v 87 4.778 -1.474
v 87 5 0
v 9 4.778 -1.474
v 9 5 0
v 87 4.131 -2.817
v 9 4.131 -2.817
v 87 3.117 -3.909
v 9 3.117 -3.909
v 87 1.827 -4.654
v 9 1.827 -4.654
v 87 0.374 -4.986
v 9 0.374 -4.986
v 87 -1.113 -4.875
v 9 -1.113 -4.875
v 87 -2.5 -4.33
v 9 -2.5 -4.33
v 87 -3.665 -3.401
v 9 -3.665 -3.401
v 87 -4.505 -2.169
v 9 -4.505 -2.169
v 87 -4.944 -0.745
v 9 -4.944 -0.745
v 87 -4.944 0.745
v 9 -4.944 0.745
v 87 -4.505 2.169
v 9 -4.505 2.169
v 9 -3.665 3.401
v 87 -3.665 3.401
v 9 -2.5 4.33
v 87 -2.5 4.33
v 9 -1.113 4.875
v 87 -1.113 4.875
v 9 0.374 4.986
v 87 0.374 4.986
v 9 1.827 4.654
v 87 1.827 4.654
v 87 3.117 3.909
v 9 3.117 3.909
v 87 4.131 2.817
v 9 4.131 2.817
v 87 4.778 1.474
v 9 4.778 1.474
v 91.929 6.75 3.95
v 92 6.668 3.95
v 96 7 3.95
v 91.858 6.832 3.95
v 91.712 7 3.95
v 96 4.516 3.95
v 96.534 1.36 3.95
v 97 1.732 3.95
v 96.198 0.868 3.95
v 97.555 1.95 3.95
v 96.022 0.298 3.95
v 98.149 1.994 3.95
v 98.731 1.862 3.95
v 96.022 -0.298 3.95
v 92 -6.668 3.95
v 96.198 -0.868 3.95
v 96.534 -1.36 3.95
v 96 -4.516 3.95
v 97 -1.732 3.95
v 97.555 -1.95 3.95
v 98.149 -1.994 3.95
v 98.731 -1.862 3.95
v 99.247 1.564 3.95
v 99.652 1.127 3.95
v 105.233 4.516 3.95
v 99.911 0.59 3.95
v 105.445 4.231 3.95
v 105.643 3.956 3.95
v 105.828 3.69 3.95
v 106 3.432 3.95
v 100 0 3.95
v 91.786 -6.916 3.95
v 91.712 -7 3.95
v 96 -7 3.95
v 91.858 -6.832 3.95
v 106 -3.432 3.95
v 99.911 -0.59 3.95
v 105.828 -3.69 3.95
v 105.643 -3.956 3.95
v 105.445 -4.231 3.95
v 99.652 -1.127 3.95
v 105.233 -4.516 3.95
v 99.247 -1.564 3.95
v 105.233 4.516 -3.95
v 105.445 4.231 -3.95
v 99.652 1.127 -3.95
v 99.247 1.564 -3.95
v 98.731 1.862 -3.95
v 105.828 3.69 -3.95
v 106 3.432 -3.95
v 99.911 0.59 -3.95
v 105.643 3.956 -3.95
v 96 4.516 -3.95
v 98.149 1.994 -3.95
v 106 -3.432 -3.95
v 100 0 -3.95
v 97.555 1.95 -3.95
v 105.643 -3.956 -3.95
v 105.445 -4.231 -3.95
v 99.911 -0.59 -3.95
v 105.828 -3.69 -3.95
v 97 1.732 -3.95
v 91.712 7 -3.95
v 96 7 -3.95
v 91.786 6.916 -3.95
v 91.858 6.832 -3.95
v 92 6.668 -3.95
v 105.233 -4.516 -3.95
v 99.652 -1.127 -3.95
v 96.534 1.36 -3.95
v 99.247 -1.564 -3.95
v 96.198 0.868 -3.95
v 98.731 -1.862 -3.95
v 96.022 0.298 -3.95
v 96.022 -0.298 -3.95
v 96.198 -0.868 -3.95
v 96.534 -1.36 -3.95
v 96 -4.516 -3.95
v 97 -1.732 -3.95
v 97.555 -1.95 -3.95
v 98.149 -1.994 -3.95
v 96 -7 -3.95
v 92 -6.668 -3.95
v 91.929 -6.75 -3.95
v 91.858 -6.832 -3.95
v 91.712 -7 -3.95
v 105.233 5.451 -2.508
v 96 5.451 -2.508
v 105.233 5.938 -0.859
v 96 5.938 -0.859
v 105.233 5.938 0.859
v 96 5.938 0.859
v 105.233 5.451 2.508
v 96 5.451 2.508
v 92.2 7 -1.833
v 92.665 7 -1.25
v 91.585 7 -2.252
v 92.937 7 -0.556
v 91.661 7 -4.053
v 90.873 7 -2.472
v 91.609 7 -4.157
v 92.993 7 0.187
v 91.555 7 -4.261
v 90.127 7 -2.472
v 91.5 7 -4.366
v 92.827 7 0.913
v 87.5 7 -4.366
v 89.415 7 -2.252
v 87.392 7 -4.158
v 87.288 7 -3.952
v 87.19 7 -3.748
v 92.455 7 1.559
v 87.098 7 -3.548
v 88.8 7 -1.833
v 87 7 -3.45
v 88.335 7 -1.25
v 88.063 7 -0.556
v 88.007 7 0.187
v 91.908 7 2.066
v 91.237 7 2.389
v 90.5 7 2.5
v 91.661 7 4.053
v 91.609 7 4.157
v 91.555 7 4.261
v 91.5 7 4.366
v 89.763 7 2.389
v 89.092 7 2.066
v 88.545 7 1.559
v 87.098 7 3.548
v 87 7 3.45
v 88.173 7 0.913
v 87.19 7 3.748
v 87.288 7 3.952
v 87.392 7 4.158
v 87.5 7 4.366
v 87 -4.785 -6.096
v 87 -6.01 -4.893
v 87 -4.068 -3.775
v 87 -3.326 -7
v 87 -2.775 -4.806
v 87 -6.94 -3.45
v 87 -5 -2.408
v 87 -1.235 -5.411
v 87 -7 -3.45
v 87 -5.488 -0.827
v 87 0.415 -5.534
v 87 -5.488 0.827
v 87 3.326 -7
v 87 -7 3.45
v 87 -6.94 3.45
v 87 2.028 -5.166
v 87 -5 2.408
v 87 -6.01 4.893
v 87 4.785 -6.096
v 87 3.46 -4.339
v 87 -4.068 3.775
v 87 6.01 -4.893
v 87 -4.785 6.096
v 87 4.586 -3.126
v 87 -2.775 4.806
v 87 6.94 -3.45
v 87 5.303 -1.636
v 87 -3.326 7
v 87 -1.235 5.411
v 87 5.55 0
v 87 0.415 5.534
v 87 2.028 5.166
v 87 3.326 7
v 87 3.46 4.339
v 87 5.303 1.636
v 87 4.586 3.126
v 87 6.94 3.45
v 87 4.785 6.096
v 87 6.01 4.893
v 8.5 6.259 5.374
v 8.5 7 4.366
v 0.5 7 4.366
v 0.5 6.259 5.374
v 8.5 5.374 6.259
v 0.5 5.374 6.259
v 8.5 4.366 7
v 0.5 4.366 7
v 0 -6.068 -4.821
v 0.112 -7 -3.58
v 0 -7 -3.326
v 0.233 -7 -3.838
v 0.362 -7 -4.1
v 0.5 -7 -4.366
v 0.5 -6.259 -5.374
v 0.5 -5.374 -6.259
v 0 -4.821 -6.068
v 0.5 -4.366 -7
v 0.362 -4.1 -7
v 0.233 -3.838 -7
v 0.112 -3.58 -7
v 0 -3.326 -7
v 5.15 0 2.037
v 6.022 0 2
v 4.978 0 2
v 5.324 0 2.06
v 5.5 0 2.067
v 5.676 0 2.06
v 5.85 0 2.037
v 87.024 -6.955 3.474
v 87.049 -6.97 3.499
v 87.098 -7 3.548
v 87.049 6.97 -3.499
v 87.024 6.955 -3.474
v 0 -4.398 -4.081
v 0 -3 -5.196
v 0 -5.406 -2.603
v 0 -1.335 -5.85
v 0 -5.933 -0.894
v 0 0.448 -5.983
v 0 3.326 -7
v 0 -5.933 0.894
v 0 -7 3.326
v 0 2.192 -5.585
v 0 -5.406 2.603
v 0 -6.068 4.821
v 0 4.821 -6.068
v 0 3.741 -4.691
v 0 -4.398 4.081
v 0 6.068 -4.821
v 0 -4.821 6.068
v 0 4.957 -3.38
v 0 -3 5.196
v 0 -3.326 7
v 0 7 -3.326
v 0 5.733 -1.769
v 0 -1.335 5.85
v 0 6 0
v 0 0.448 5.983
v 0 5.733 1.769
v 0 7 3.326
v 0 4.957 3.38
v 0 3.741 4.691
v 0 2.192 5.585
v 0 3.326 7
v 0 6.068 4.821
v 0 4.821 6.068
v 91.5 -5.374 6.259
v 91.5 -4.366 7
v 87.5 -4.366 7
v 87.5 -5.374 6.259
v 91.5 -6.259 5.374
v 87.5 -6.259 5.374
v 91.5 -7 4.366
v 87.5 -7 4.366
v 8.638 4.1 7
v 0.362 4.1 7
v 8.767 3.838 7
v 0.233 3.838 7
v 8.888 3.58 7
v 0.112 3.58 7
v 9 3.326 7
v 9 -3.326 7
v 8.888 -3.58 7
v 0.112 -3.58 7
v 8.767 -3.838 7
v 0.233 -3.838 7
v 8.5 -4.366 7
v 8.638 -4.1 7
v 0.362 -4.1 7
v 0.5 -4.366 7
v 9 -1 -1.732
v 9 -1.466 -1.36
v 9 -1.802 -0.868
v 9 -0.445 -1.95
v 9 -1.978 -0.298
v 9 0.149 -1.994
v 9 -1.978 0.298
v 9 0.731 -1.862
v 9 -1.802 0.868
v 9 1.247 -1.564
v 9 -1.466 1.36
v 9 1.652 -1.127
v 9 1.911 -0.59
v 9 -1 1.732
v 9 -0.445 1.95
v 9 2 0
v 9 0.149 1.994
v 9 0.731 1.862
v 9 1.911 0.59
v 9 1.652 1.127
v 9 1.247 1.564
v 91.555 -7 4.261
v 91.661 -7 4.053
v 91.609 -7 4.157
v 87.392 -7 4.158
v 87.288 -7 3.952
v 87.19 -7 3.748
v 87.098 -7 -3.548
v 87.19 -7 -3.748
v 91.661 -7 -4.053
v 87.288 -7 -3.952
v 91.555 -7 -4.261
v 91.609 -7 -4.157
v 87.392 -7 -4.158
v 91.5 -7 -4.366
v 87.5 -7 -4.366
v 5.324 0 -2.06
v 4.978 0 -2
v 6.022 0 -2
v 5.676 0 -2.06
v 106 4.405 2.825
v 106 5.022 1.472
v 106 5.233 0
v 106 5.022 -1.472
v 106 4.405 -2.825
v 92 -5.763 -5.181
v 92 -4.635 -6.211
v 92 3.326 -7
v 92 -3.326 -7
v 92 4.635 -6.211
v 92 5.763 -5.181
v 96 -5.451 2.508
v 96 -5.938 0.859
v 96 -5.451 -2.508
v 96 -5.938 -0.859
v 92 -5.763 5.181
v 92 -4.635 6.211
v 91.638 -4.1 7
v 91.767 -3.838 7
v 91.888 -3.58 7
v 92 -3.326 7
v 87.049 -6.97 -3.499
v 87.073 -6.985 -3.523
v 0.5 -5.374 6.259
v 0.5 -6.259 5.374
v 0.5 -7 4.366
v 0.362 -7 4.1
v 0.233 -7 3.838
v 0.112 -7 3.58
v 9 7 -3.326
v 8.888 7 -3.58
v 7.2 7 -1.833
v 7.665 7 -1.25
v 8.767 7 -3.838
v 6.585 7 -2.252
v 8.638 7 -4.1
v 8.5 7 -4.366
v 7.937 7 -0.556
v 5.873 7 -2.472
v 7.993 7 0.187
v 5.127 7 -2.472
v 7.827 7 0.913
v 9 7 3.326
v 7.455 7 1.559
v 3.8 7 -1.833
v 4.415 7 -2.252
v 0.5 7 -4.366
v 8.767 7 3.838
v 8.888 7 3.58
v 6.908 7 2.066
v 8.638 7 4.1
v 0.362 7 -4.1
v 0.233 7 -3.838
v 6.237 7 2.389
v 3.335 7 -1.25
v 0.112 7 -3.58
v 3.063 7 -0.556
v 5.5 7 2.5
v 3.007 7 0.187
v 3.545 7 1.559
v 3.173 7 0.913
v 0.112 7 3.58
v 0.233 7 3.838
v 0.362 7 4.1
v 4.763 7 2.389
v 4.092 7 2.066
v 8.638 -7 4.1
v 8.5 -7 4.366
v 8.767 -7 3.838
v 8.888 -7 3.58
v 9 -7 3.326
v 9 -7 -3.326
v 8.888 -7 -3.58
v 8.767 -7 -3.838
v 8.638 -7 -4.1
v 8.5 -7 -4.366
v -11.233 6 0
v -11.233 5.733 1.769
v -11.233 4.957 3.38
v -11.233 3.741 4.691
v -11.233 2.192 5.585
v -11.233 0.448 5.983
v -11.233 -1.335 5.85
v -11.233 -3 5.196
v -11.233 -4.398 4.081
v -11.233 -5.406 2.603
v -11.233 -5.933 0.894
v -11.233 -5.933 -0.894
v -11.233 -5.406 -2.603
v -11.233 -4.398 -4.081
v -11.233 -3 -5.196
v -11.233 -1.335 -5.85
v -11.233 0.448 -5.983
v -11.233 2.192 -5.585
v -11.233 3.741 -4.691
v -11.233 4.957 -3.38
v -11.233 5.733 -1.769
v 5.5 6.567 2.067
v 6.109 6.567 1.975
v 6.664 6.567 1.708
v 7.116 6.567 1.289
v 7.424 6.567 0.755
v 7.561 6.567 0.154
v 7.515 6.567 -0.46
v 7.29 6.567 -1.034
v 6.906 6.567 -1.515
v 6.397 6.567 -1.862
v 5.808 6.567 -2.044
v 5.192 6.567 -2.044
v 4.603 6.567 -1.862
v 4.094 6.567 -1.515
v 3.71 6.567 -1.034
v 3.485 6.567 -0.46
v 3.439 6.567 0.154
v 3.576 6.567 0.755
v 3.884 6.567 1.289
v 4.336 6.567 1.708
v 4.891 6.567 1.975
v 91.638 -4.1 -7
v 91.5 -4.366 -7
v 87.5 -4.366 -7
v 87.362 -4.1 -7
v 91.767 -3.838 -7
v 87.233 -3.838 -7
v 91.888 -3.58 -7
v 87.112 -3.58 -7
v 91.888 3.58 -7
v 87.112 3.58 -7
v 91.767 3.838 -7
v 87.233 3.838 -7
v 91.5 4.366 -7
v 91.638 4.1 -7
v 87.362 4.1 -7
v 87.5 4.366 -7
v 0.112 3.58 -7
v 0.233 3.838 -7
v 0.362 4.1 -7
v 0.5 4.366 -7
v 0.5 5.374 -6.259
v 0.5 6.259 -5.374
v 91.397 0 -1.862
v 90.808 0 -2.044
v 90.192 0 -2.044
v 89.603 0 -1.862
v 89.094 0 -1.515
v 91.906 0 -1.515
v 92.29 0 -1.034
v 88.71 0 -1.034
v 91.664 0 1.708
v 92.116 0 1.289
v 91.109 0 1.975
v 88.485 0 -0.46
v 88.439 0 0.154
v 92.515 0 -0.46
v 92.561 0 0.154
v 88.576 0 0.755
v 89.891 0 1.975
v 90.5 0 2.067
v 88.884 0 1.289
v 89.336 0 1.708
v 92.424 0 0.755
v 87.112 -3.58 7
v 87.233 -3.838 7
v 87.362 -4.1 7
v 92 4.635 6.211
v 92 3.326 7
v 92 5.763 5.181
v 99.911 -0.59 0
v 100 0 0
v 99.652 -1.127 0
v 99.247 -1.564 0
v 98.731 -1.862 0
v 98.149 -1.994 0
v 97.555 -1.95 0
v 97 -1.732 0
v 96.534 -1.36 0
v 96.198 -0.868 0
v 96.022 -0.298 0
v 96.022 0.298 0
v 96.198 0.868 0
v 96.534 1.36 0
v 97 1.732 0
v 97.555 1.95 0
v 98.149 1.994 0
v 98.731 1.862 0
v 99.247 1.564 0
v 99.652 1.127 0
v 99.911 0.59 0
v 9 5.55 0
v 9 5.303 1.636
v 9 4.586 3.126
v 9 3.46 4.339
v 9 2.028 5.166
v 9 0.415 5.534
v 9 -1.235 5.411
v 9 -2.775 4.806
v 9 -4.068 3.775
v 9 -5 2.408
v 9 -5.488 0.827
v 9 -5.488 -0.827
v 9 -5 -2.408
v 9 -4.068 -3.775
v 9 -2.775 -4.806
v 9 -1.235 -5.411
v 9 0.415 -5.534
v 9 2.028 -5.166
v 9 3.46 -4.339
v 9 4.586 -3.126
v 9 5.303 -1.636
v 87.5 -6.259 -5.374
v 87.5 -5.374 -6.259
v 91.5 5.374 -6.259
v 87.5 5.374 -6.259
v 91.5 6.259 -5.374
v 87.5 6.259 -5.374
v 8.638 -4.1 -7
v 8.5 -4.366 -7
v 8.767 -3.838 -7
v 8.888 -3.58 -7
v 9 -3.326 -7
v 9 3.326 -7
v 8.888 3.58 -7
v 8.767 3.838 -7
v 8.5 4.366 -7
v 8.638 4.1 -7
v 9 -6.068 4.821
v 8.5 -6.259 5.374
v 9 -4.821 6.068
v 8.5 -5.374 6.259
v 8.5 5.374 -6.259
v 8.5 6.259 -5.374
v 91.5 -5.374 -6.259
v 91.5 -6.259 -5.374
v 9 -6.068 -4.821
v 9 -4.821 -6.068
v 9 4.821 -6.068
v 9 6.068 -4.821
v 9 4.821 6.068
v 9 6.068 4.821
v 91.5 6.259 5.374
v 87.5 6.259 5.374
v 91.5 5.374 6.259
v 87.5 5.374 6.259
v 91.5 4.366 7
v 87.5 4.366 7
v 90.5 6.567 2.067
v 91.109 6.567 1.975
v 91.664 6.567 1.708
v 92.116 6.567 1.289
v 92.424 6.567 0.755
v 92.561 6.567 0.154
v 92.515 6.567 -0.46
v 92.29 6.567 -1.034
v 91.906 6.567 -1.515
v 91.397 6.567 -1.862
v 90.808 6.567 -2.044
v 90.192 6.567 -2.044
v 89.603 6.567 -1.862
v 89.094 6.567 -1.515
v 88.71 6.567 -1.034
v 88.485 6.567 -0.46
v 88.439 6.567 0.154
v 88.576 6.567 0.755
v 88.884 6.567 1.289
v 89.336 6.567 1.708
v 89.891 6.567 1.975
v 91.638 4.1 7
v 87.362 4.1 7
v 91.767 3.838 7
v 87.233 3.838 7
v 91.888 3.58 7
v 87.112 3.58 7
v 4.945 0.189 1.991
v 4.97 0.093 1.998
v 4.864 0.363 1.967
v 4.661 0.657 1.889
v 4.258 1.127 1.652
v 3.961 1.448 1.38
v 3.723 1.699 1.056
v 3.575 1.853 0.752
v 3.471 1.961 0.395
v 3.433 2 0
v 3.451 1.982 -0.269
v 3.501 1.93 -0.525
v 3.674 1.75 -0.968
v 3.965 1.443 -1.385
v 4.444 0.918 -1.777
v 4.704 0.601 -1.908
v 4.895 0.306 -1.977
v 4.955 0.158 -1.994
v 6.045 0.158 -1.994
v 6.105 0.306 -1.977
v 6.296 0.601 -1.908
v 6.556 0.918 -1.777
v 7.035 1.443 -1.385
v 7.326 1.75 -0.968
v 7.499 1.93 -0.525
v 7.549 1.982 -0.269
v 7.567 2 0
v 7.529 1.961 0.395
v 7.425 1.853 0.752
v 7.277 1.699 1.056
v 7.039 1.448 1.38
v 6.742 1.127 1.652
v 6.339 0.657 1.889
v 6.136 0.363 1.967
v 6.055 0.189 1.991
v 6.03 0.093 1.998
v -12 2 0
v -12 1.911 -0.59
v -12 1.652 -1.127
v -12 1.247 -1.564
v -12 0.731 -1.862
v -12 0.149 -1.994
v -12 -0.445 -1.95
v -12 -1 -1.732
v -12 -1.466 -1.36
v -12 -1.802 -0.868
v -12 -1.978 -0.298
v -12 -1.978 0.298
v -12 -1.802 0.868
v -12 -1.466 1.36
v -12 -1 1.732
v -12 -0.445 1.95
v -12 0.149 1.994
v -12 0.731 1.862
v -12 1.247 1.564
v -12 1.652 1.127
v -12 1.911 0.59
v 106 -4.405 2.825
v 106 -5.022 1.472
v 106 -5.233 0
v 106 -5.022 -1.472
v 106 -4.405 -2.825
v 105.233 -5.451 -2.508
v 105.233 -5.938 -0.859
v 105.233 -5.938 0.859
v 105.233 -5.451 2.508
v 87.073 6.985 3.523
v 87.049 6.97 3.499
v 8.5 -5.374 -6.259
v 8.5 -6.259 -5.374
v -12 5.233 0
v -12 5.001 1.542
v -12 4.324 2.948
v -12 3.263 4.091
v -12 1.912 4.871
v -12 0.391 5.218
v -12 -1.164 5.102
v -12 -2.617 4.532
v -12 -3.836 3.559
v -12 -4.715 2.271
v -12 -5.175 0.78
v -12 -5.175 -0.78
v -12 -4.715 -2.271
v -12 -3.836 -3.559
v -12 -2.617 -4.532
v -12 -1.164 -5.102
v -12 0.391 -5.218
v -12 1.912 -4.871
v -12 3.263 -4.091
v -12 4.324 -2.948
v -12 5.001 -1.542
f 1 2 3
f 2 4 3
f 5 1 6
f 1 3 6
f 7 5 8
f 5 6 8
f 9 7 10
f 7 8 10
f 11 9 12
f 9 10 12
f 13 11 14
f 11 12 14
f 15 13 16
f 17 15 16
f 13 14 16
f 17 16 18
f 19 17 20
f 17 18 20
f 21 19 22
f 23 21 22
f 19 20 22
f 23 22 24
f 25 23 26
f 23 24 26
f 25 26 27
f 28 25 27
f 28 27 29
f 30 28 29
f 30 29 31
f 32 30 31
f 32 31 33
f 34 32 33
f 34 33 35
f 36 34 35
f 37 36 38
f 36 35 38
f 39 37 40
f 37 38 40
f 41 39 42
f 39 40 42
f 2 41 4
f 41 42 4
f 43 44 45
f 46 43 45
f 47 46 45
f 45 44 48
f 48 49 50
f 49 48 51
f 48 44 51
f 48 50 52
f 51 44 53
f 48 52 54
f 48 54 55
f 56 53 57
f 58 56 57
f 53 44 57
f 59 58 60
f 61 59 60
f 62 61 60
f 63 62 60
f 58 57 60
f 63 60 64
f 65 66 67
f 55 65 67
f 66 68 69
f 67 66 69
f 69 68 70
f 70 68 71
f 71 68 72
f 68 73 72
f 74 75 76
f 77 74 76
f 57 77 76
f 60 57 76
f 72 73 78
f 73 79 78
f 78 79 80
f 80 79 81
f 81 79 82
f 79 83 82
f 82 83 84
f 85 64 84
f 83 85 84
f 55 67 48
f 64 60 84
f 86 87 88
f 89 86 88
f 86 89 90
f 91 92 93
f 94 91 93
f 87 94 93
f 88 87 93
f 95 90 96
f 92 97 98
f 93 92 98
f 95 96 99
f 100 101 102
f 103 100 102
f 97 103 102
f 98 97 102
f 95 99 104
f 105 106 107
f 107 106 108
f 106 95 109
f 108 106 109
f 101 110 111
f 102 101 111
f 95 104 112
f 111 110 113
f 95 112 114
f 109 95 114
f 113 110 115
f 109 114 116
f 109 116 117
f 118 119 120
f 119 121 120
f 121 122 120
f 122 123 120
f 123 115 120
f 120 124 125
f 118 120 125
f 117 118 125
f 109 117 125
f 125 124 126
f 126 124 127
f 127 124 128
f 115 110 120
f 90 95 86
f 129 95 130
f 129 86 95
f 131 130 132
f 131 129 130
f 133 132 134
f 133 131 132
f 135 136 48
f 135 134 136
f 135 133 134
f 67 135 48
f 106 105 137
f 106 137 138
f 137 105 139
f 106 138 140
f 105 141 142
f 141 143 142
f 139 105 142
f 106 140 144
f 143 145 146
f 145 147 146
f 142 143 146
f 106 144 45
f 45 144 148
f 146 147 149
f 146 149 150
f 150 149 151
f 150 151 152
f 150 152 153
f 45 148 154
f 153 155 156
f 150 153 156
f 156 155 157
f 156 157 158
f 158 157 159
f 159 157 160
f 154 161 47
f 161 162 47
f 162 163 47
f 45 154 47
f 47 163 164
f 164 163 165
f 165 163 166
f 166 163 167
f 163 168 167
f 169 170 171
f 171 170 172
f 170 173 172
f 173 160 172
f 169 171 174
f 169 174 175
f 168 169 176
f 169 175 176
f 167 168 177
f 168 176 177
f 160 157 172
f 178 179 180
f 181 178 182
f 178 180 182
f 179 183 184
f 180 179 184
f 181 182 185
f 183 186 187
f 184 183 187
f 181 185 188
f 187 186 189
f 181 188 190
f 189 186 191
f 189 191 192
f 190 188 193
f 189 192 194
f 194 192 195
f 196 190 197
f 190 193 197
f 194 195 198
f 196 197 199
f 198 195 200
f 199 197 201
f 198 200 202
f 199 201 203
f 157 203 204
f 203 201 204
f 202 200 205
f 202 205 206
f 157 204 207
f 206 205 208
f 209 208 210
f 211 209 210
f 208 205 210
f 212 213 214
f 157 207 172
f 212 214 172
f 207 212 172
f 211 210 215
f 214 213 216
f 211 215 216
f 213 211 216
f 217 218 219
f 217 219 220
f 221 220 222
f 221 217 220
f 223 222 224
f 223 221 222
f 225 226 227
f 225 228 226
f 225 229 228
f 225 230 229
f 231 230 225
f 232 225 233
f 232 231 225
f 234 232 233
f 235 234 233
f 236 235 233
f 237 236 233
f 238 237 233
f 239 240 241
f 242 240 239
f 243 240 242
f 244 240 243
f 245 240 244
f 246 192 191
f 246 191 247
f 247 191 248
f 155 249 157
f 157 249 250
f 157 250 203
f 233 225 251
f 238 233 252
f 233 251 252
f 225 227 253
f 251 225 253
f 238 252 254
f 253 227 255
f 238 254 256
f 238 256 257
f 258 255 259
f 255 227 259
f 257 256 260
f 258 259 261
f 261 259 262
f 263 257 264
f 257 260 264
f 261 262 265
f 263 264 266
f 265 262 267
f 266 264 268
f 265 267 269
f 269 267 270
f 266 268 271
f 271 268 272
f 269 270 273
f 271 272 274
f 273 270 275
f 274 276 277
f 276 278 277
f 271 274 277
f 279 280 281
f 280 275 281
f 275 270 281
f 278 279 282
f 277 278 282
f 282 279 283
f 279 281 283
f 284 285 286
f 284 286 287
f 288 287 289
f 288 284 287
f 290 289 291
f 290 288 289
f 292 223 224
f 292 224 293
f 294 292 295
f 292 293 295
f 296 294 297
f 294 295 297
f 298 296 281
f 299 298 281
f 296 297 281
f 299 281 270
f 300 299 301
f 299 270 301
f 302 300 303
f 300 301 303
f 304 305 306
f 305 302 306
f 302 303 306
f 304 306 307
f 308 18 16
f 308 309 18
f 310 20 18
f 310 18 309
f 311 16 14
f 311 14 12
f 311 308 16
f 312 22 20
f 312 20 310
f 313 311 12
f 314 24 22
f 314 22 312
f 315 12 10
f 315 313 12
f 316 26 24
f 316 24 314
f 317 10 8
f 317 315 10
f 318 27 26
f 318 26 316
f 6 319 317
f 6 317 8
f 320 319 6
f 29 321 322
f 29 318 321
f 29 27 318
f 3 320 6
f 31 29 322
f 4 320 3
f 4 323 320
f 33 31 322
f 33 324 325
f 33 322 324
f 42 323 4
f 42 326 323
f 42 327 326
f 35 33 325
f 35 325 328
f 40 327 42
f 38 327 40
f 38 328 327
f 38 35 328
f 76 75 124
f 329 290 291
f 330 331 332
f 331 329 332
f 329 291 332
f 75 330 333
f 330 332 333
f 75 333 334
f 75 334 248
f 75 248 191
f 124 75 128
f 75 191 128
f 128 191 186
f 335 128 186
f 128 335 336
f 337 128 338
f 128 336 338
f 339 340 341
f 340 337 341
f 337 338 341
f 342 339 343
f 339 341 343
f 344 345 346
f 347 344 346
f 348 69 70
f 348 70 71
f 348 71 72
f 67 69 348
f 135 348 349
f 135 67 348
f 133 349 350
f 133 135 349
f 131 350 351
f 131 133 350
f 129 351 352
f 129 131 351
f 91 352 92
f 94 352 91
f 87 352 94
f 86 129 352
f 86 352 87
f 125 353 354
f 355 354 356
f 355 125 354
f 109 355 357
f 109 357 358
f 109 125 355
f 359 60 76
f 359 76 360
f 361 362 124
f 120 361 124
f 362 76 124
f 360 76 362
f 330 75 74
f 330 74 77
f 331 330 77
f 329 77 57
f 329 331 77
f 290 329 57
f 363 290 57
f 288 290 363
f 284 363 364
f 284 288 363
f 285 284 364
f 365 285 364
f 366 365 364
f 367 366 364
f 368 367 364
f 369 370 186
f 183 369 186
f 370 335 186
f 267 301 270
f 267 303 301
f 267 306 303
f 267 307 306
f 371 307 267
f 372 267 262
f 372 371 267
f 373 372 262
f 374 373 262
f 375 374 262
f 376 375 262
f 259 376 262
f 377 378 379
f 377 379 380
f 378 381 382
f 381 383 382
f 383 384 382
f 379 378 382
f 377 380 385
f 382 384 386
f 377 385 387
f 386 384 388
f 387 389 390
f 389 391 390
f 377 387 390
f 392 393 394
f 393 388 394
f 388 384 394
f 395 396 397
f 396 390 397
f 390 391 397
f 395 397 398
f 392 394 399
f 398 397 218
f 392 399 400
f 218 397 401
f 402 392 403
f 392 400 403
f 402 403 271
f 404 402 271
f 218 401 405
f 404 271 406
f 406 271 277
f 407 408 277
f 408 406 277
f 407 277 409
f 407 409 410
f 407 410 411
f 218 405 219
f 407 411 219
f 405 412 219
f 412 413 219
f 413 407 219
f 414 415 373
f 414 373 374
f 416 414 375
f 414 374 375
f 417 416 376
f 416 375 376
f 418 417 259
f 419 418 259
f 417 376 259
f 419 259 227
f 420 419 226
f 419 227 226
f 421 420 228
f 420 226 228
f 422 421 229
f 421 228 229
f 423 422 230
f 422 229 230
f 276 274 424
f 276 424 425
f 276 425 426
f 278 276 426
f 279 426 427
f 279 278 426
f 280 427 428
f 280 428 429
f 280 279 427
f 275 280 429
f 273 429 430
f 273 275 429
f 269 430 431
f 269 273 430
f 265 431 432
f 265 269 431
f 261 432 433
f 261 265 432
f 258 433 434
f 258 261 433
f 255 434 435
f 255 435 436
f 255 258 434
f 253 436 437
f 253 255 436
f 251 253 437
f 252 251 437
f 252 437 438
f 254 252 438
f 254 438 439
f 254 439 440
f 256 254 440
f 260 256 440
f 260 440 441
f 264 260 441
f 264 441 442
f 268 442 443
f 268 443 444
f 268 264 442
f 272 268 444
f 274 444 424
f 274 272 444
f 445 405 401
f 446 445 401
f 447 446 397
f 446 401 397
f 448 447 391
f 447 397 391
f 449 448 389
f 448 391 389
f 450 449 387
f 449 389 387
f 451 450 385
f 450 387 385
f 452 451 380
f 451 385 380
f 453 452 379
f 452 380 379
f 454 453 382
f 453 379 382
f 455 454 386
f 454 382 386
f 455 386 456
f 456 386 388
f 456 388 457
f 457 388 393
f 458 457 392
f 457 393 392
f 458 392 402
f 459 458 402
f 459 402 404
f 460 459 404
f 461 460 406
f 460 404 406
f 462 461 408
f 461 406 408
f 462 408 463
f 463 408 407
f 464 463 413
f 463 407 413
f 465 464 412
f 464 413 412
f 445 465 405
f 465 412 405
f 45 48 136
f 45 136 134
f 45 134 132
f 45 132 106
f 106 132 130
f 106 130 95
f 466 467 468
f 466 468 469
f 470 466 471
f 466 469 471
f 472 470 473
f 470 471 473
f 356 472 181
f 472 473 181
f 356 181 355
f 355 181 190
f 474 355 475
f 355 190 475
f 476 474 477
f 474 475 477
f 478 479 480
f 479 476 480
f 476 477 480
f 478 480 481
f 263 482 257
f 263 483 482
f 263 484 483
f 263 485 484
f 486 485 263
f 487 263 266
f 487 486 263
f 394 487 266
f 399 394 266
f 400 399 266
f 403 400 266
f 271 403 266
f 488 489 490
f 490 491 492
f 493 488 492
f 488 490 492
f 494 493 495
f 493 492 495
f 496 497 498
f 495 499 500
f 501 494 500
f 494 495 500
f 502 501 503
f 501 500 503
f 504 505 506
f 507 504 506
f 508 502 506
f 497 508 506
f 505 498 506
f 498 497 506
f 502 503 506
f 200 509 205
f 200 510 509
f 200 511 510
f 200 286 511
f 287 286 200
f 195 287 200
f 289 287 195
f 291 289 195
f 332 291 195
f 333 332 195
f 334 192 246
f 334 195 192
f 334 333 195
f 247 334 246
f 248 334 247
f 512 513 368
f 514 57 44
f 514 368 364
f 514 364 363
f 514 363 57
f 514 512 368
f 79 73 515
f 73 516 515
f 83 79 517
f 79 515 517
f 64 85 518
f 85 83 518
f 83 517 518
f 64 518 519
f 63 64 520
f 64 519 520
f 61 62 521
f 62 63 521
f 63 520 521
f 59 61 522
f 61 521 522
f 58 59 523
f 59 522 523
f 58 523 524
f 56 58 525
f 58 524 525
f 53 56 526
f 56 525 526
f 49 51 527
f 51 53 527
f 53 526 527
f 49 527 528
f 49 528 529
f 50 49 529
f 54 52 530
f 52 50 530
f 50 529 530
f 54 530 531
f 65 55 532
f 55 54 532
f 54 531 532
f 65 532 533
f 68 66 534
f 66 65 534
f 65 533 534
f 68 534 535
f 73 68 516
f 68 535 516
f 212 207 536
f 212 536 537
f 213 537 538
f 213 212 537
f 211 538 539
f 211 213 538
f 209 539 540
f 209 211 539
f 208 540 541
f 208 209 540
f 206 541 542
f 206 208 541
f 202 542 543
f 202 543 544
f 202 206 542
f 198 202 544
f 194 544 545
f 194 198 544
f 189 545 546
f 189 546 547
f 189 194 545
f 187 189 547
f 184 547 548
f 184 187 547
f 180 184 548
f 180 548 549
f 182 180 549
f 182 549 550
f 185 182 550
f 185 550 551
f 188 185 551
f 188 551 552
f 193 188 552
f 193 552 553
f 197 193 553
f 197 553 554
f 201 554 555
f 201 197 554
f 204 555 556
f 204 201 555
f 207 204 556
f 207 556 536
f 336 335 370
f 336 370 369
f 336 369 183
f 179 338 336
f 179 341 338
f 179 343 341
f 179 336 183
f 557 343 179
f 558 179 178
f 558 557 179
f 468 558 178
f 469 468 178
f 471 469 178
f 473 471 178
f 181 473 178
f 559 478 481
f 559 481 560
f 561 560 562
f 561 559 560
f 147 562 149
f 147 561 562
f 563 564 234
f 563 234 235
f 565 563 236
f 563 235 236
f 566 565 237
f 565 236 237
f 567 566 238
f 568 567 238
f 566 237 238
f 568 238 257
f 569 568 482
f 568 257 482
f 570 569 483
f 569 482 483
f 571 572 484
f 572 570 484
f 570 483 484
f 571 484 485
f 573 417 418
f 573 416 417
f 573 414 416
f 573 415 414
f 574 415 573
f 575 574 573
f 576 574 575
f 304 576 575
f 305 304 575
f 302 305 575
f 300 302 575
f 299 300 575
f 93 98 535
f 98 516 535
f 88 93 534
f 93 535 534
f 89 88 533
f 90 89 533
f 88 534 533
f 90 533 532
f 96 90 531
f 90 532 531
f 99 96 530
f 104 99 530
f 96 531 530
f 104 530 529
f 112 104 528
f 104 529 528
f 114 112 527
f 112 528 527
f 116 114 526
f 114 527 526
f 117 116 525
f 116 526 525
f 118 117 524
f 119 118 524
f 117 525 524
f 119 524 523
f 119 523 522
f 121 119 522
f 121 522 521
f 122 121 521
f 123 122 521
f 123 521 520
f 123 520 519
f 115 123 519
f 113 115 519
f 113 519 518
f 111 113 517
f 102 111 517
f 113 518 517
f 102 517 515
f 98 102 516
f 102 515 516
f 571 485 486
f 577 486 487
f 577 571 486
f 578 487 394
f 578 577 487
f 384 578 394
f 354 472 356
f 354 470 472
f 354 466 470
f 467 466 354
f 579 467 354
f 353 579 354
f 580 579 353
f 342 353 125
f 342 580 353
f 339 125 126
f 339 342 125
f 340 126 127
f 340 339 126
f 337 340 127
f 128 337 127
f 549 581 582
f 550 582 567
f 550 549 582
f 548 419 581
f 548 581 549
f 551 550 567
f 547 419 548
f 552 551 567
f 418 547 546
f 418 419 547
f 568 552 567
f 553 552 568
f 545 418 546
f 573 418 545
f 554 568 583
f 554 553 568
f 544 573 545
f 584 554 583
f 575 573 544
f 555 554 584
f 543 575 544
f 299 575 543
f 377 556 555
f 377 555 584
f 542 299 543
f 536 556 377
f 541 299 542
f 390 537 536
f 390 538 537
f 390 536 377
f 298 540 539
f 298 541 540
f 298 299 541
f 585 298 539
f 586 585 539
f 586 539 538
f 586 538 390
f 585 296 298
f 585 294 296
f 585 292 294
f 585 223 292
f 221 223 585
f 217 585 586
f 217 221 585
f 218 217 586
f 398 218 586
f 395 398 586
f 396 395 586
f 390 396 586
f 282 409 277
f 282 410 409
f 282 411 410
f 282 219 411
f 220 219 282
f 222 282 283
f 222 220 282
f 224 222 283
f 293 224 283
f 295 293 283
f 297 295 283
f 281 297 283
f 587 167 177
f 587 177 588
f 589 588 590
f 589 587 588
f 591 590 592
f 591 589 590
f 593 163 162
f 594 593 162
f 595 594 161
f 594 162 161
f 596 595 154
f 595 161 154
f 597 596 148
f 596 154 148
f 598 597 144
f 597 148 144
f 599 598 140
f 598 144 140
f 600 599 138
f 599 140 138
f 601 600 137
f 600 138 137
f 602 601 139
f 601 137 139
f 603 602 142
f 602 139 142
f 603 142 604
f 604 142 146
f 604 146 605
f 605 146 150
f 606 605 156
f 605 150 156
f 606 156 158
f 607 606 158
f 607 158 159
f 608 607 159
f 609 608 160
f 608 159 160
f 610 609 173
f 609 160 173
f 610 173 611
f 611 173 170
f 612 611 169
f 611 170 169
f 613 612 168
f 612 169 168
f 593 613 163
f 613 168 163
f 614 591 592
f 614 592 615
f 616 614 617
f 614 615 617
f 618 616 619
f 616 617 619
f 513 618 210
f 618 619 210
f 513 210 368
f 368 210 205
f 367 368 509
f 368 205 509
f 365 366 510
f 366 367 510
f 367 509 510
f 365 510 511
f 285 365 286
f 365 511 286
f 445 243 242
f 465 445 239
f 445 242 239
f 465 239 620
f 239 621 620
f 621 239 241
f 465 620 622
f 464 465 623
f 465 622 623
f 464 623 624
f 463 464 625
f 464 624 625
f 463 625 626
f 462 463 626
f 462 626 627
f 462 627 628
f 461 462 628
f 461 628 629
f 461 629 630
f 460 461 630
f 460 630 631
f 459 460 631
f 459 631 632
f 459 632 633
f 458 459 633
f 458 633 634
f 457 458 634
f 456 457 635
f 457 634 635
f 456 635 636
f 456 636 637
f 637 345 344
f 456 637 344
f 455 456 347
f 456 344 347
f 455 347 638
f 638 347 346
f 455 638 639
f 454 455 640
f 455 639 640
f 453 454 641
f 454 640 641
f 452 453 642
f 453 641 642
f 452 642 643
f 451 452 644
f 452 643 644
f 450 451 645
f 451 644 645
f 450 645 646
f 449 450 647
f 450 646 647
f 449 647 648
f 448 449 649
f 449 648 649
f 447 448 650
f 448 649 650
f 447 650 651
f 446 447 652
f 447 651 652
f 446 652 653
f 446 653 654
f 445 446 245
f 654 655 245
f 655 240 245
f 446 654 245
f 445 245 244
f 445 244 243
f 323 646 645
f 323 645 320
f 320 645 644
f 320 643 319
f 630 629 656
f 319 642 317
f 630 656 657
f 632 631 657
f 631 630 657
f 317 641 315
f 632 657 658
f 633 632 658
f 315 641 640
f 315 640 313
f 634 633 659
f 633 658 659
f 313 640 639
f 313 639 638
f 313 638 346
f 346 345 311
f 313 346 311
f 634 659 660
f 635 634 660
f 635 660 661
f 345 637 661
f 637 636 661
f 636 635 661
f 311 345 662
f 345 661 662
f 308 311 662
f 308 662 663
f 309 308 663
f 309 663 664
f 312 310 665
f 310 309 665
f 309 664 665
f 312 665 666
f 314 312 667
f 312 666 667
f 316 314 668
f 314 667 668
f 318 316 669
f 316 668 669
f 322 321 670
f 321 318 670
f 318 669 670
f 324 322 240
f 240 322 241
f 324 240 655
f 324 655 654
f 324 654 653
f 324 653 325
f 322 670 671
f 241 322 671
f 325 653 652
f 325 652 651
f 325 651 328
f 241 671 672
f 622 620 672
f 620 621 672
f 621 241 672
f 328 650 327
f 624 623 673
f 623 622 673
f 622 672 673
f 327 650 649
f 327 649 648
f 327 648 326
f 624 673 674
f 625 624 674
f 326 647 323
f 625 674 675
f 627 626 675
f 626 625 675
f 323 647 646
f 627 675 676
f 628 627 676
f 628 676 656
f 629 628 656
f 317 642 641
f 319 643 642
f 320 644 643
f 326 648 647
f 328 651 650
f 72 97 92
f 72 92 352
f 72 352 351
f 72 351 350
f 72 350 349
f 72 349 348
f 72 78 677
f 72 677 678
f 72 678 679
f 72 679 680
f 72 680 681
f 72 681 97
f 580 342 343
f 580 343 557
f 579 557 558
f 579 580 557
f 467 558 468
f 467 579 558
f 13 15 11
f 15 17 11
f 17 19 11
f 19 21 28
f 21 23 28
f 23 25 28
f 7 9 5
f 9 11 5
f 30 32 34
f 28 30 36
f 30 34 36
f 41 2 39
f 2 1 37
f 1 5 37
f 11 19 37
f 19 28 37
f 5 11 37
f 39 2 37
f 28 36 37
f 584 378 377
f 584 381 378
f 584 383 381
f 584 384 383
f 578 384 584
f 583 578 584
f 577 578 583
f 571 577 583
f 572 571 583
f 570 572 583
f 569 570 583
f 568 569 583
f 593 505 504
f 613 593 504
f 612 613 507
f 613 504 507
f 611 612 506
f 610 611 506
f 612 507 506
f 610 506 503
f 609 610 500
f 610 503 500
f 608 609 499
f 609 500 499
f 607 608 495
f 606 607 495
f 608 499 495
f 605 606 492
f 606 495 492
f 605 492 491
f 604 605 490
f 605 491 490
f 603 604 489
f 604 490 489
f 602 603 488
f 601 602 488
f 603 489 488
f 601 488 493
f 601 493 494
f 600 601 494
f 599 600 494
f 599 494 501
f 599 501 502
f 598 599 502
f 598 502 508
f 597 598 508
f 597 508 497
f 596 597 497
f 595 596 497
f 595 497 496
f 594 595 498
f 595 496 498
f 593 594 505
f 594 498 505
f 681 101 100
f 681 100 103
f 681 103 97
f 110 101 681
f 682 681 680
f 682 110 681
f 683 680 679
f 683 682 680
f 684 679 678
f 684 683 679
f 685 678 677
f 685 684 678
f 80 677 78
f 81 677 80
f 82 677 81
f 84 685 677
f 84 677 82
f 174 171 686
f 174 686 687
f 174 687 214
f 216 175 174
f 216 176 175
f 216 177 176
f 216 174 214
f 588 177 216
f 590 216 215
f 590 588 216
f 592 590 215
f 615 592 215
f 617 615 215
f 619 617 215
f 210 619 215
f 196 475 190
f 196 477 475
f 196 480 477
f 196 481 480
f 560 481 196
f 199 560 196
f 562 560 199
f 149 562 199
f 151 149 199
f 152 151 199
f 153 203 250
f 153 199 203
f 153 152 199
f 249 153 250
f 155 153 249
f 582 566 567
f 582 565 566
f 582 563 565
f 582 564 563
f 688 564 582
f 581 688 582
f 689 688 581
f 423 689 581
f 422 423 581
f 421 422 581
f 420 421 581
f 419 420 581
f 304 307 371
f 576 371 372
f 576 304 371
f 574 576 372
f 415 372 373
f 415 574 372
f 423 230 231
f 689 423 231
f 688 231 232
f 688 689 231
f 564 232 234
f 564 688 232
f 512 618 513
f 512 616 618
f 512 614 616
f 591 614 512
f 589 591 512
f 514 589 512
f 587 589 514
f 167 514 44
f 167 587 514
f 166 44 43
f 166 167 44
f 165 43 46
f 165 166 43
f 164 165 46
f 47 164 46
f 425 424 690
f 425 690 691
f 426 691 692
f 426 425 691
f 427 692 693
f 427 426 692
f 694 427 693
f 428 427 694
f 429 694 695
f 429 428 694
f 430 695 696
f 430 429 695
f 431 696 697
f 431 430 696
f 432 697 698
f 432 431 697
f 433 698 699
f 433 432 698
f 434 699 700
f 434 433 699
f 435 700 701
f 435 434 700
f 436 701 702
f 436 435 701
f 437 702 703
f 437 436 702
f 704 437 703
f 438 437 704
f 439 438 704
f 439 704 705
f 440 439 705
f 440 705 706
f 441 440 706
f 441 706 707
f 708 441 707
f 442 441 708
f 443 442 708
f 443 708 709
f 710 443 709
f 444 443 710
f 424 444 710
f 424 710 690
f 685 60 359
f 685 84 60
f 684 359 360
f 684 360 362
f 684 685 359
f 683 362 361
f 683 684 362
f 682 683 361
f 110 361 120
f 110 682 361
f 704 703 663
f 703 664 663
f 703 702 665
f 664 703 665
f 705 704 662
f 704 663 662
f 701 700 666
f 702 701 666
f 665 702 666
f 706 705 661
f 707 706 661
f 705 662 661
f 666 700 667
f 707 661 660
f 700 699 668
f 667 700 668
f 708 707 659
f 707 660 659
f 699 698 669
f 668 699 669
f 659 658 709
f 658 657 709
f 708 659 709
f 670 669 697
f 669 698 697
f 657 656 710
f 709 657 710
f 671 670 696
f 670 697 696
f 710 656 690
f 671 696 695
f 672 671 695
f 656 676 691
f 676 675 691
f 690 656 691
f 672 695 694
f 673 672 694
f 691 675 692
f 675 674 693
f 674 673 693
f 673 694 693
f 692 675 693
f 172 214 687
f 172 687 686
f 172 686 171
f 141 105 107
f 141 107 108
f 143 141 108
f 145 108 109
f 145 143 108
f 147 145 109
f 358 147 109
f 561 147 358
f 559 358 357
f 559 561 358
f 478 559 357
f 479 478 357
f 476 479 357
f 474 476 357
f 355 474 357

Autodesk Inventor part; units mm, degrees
sketch "Sketch_2" plane through (0, 0, 0) normal (0, 0, 1) x (1, 0, 0)
  line L0 (106, 0) -> (-12, 0)
  line L1 (87, 0) -> (87, 5)
  line L2 (87, 5) -> (9, 5)
  line L3 (9, 5) -> (9, 2)
  line L4 (9, 2) -> (-12, 2)
  line L5 (-12, 2) -> (-12, 5.233)
  line L6 (-12, 5.233) -> (-11.233, 6)
  line L7 (-11.233, 6) -> (0, 6)
  line L8 (0, 6) -> (0, 7.75)
  line L9 (0, 7.75) -> (0.5, 8.25)
  line L10 (0.5, 8.25) -> (8.5, 8.25)
  line L11 (8.5, 8.25) -> (9, 7.75)
  line L12 (9, 7.75) -> (9, 5.55)
  line L13 (9, 5.55) -> (87, 5.55)
  line L14 (87, 5.55) -> (87, 7.75)
  line L15 (87, 7.75) -> (87.5, 8.25)
  line L16 (87.5, 8.25) -> (91.5, 8.25)
  line L17 (91.5, 8.25) -> (92, 7.75)
  line L18 (92, 7.75) -> (92, 6)
  line L19 (92, 6) -> (105.233, 6)
  line L20 (105.233, 6) -> (106, 5.233)
  line L21 (106, 5.233) -> (106, 0)
  line L22 (106, 0) -> (87, 0)
revolve "Revolution1" add sketch "Sketch_2" angle 360 about axis through (106, 0, 0) along (1, 0, 0)
thread "Thread1" size "M12x1.25" class "6g" standard "ISO Metric profile" length 9.733
thread "Thread2" size "M12x1.25" class "6g" standard "ISO Metric profile" length 7.733
sketch "Sketch_3" plane through (0, 0, 0) normal (0, 1, 0) x (-1, 0, 0)
  line L0 (-87, 3.45) -> (-87.5, 3.95)
  line L1 (-87.5, 3.95) -> (-96, 3.95)
  line L2 (-96, 3.95) -> (-96, -3.95)
  line L3 (-96, -3.95) -> (-87.5, -3.95)
  line L4 (-87.5, -3.95) -> (-87, -3.45)
  line L5 (-87, -3.45) -> (-87, 3.45)
extrude "Extrusion1" add sketch "Sketch_3" along normal mid plane 16.5
sketch "Sketch_4" plane through (0, 0, 0) normal (0, 1, 0) x (-1, 0, 0)
  line L0 (-92, 13.95) -> (-111, 13.95)
  line L1 (-111, 13.95) -> (-111, -13.95)
  line L2 (-111, -13.95) -> (-92, -13.95)
  line L3 (-92, -13.95) -> (-92, -3.95)
  line L4 (-92, -3.95) -> (-106, -3.95)
  line L5 (-106, -3.95) -> (-106, 3.95)
  line L6 (-106, 3.95) -> (-92, 3.95)
  line L7 (-92, 3.95) -> (-92, 13.95)
extrude "Extrusion2" cut sketch "Sketch_4" along normal mid plane 16.5
sketch "Sketch_5" plane through (0, 0, 0) normal (1, 0, 0) x (0, 1, 0)
  line L0 (-14, 14) -> (-14, -14)
  line L1 (-14, -14) -> (14, -14)
  line L2 (14, -14) -> (14, 14)
  line L3 (14, 14) -> (-14, 14)
  line L4 (-7, 7) -> (-7, -7)
  line L5 (-7, -7) -> (7, -7)
  line L6 (7, -7) -> (7, 7)
  line L7 (7, 7) -> (-7, 7)
extrude "Extrusion3" cut sketch "Sketch_5" along normal blind 9
sketch "Sketch_6" plane through (90.5, 0, 0) normal (1, 0, 0) x (0, 0, -1)
  line L0 (-14, -14) -> (14, -14)
  line L1 (14, -14) -> (14, 14)
  line L2 (14, 14) -> (-14, 14)
  line L3 (-14, 14) -> (-14, -14)
  line L4 (-7, -7) -> (7, -7)
  line L5 (7, -7) -> (7, 7)
  line L6 (7, 7) -> (-7, 7)
  line L7 (-7, 7) -> (-7, -7)
extrude "Extrusion4" cut sketch "Sketch_6" along normal mid plane 18
sketch "Sketch6" plane through (0.5, 7, -4.3661) normal (0, 1, 0) x (1, 0, 0)
  point P0 (5, -4.3661)
hole "Hole1" at (5.5, 7, 0) direction (0, -1, 0) diameter 4.134 depth 7 countersink diameter 5 countersink angle 90 thread size "M5x0.8" class "6H" standard "ISO Metric profile"
sketch "Sketch7" plane through (91.7124, 7, 3.95) normal (0, 1, 0) x (1, 0, 0)
  point P0 (-1.2124, 3.95)
hole "Hole2" at (90.5, 7, 0) direction (0, -1, 0) diameter 4.134 depth 7 countersink diameter 5 countersink angle 90 thread size "M5x0.8" class "6H" standard "ISO Metric profile"
sketch "Sketch_9" plane through (0, 0, 0) normal (0, 0, 1) x (1, 0, 0)
  circle A0 centre (98, 0) radius 2
extrude "Extrusion5" cut sketch "Sketch_9" along normal mid plane 7.9
ref_plane "AC_XY" through (98, 0, 0) normal (0, 0, 1) x (1, 0, 0)
ref_plane "AC_YZ" through (98, 0, 0) normal (1, 0, 0) x (0, 1, 0)
ref_plane "AC_ZX" through (98, 0, 0) normal (0, 1, 0) x (0, 0, 1)
ref_plane "DUMMY_XY" through (0, 0, 0) normal (0, 1, 0) x (1, 0, 0)
ref_plane "DUMMY_YZ" through (0, 0, 0) normal (1, 0, 0) x (0, 0, -1)
ref_plane "DUMMY_ZX" through (0, 0, 0) normal (0, 0, -1) x (0, 1, 0)
ref_plane "FM_XY" through (0, 0, 0) normal (-1, 0, 0) x (0, 0, -1)
ref_plane "FM_YZ" through (0, 0, 0) normal (0, 0, -1) x (0, -1, 0)
ref_plane "FM_ZX" through (0, 0, 0) normal (0, -1, 0) x (-1, 0, 0)
ref_plane "FMFM_XY" through (0, 0, 0) normal (-1, 0, 0) x (0, 0, -1)
ref_plane "FMFM_YZ" through (0, 0, 0) normal (0, 0, -1) x (0, -1, 0)
ref_plane "FMFM_ZX" through (0, 0, 0) normal (0, -1, 0) x (-1, 0, 0)
ref_plane "NUT_XY" through (-2, 0, 0) normal (-1, 0, 0) x (0, 0, -1)
ref_plane "NUT_YZ" through (-2, 0, 0) normal (0, 0, -1) x (0, -1, 0)
ref_plane "NUT_ZX" through (-2, 0, 0) normal (0, -1, 0) x (-1, 0, 0)
ref_plane "POINT_XY" through (-12, 0, 0) normal (-1, 0, 0) x (0, 0, -1)
ref_plane "POINT_YZ" through (-12, 0, 0) normal (0, 0, -1) x (0, -1, 0)
ref_plane "POINT_ZX" through (-12, 0, 0) normal (0, -1, 0) x (-1, 0, 0)
ref_plane "RM_XY" through (96, 0, 0) normal (1, 0, 0) x (0, 0, -1)
ref_plane "RM_YZ" through (96, 0, 0) normal (0, 0, -1) x (0, 1, 0)
ref_plane "RM_ZX" through (96, 0, 0) normal (0, 1, 0) x (1, 0, 0)
ref_plane "S_XY" through (26, 0, 0) normal (1, 0, 0) x (0, 0, -1)
ref_plane "S_YZ" through (26, 0, 0) normal (0, 0, -1) x (0, 1, 0)
ref_plane "S_ZX" through (26, 0, 0) normal (0, 1, 0) x (1, 0, 0)
ref_plane "dim_0_XY" through (0, 0, 0) normal (0, 0, 1) x (1, 0, 0)
ref_plane "dim_0_YZ" through (0, 0, 0) normal (1, 0, 0) x (0, 1, 0)
ref_plane "dim_0_ZX" through (0, 0, 0) normal (0, 1, 0) x (0, 0, 1)
ref_plane "dim_bex1_XY" through (105.233, 6, 0) normal (0, 0, 1) x (1, 0, 0)
ref_plane "dim_bex1_YZ" through (105.233, 6, 0) normal (1, 0, 0) x (0, 1, 0)
ref_plane "dim_bex1_ZX" through (105.233, 6, 0) normal (0, 1, 0) x (0, 0, 1)
ref_plane "dim_bex2_XY" through (105.233, -6, 0) normal (0, 0, 1) x (1, 0, 0)
ref_plane "dim_bex2_YZ" through (105.233, -6, 0) normal (1, 0, 0) x (0, 1, 0)
ref_plane "dim_bex2_ZX" through (105.233, -6, 0) normal (0, 1, 0) x (0, 0, 1)
ref_plane "dim_cd1_XY" through (98, 2, 0) normal (0, 0, 1) x (1, 0, 0)
ref_plane "dim_cd1_YZ" through (98, 2, 0) normal (1, 0, 0) x (0, 1, 0)
ref_plane "dim_cd1_ZX" through (98, 2, 0) normal (0, 1, 0) x (0, 0, 1)
ref_plane "dim_cd2_XY" through (98, -2, 0) normal (0, 0, 1) x (1, 0, 0)
ref_plane "dim_cd2_YZ" through (98, -2, 0) normal (1, 0, 0) x (0, 1, 0)
ref_plane "dim_cd2_ZX" through (98, -2, 0) normal (0, 1, 0) x (0, 0, 1)
ref_plane "dim_d1_XY" through (18, 5.55, 0) normal (0, 0, 1) x (1, 0, 0)
ref_plane "dim_d1_YZ" through (18, 5.55, 0) normal (1, 0, 0) x (0, 1, 0)
ref_plane "dim_d1_ZX" through (18, 5.55, 0) normal (0, 1, 0) x (0, 0, 1)
ref_plane "dim_d2_XY" through (18, -5.55, 0) normal (0, 0, 1) x (1, 0, 0)
ref_plane "dim_d2_YZ" through (18, -5.55, 0) normal (1, 0, 0) x (0, 1, 0)
ref_plane "dim_d2_ZX" through (18, -5.55, 0) normal (0, 1, 0) x (0, 0, 1)
ref_plane "dim_ee_XY" through (5.5, 7, 0) normal (0, 0, 1) x (1, 0, 0)
ref_plane "dim_ee_YZ" through (5.5, 7, 0) normal (1, 0, 0) x (0, 1, 0)
ref_plane "dim_ee_ZX" through (5.5, 7, 0) normal (0, 1, 0) x (0, 0, 1)
ref_plane "dim_ee1_XY" through (3, 7, 0) normal (0, 0, 1) x (1, 0, 0)
ref_plane "dim_ee1_YZ" through (3, 7, 0) normal (1, 0, 0) x (0, 1, 0)
ref_plane "dim_ee1_ZX" through (3, 7, 0) normal (0, 1, 0) x (0, 0, 1)
ref_plane "dim_ee2_XY" through (8, 7, 0) normal (0, 0, 1) x (1, 0, 0)
ref_plane "dim_ee2_YZ" through (8, 7, 0) normal (1, 0, 0) x (0, 1, 0)
ref_plane "dim_ee2_ZX" through (8, 7, 0) normal (0, 1, 0) x (0, 0, 1)
ref_plane "dim_ew1_XY" through (96, 0, -3.95) normal (0, 1, 0) x (1, 0, 0)
ref_plane "dim_ew1_YZ" through (96, 0, -3.95) normal (1, 0, 0) x (0, 0, -1)
ref_plane "dim_ew1_ZX" through (96, 0, -3.95) normal (0, 0, -1) x (0, 1, 0)
ref_plane "dim_ew2_XY" through (96, 0, 3.95) normal (0, 1, 0) x (1, 0, 0)
ref_plane "dim_ew2_YZ" through (96, 0, 3.95) normal (1, 0, 0) x (0, 0, -1)
ref_plane "dim_ew2_ZX" through (96, 0, 3.95) normal (0, 0, -1) x (0, 1, 0)
ref_plane "dim_g_XY" through (9, 0, 0) normal (0, 0, 1) x (1, 0, 0)
ref_plane "dim_g_YZ" through (9, 0, 0) normal (1, 0, 0) x (0, 1, 0)
ref_plane "dim_g_ZX" through (9, 0, 0) normal (0, 1, 0) x (0, 0, 1)
ref_plane "dim_gew_bottom_XY" through (-12, -6, 0) normal (0, 0, 1) x (1, 0, 0)
ref_plane "dim_gew_bottom_YZ" through (-12, -6, 0) normal (1, 0, 0) x (0, 1, 0)
ref_plane "dim_gew_bottom_ZX" through (-12, -6, 0) normal (0, 1, 0) x (0, 0, 1)
ref_plane "dim_gew_top_XY" through (-12, 6, 0) normal (0, 0, 1) x (1, 0, 0)
ref_plane "dim_gew_top_YZ" through (-12, 6, 0) normal (1, 0, 0) x (0, 1, 0)
ref_plane "dim_gew_top_ZX" through (-12, 6, 0) normal (0, 1, 0) x (0, 0, 1)
ref_plane "dim_kv41_XY" through (0, 0, 7) normal (1, 0, 0) x (0, 0, -1)
ref_plane "dim_kv41_YZ" through (0, 0, 7) normal (0, 0, -1) x (0, 1, 0)
ref_plane "dim_kv41_ZX" through (0, 0, 7) normal (0, 1, 0) x (1, 0, 0)
ref_plane "dim_kv42_XY" through (0, 0, -7) normal (1, 0, 0) x (0, 0, -1)
ref_plane "dim_kv42_YZ" through (0, 0, -7) normal (0, 0, -1) x (0, 1, 0)
ref_plane "dim_kv42_ZX" through (0, 0, -7) normal (0, 1, 0) x (1, 0, 0)
ref_plane "dim_l_XY" through (92, 6, 0) normal (0, 0, 1) x (1, 0, 0)
ref_plane "dim_l_YZ" through (92, 6, 0) normal (1, 0, 0) x (0, 1, 0)
ref_plane "dim_l_ZX" through (92, 6, 0) normal (0, 1, 0) x (0, 0, 1)
ref_plane "dim_left_XY" through (-12, 0, 0) normal (0, 0, 1) x (1, 0, 0)
ref_plane "dim_left_YZ" through (-12, 0, 0) normal (1, 0, 0) x (0, 1, 0)
ref_plane "dim_left_ZX" through (-12, 0, 0) normal (0, 1, 0) x (0, 0, 1)
ref_plane "dim_right_XY" through (106, 0, 0) normal (0, 0, 1) x (1, 0, 0)
ref_plane "dim_right_YZ" through (106, 0, 0) normal (1, 0, 0) x (0, 1, 0)
ref_plane "dim_right_ZX" through (106, 0, 0) normal (0, 1, 0) x (0, 0, 1)
ref_plane "dim_right_g_XY" through (87, 0, 0) normal (0, 0, 1) x (1, 0, 0)
ref_plane "dim_right_g_YZ" through (87, 0, 0) normal (1, 0, 0) x (0, 1, 0)
ref_plane "dim_right_g_ZX" through (87, 0, 0) normal (0, 1, 0) x (0, 0, 1)
ref_plane "dim_right_hub_XY" through (96, 0, 0) normal (0, 0, 1) x (1, 0, 0)
ref_plane "dim_right_hub_YZ" through (96, 0, 0) normal (1, 0, 0) x (0, 1, 0)
ref_plane "dim_right_hub_ZX" through (96, 0, 0) normal (0, 1, 0) x (0, 0, 1)
ref_plane "dim_va_XY" through (97.5, 0, 0) normal (0, 0, 1) x (1, 0, 0)
ref_plane "dim_va_YZ" through (97.5, 0, 0) normal (1, 0, 0) x (0, 1, 0)
ref_plane "dim_va_ZX" through (97.5, 0, 0) normal (0, 1, 0) x (0, 0, 1)
properties part number "RM/8010/M/50_B0__B"
